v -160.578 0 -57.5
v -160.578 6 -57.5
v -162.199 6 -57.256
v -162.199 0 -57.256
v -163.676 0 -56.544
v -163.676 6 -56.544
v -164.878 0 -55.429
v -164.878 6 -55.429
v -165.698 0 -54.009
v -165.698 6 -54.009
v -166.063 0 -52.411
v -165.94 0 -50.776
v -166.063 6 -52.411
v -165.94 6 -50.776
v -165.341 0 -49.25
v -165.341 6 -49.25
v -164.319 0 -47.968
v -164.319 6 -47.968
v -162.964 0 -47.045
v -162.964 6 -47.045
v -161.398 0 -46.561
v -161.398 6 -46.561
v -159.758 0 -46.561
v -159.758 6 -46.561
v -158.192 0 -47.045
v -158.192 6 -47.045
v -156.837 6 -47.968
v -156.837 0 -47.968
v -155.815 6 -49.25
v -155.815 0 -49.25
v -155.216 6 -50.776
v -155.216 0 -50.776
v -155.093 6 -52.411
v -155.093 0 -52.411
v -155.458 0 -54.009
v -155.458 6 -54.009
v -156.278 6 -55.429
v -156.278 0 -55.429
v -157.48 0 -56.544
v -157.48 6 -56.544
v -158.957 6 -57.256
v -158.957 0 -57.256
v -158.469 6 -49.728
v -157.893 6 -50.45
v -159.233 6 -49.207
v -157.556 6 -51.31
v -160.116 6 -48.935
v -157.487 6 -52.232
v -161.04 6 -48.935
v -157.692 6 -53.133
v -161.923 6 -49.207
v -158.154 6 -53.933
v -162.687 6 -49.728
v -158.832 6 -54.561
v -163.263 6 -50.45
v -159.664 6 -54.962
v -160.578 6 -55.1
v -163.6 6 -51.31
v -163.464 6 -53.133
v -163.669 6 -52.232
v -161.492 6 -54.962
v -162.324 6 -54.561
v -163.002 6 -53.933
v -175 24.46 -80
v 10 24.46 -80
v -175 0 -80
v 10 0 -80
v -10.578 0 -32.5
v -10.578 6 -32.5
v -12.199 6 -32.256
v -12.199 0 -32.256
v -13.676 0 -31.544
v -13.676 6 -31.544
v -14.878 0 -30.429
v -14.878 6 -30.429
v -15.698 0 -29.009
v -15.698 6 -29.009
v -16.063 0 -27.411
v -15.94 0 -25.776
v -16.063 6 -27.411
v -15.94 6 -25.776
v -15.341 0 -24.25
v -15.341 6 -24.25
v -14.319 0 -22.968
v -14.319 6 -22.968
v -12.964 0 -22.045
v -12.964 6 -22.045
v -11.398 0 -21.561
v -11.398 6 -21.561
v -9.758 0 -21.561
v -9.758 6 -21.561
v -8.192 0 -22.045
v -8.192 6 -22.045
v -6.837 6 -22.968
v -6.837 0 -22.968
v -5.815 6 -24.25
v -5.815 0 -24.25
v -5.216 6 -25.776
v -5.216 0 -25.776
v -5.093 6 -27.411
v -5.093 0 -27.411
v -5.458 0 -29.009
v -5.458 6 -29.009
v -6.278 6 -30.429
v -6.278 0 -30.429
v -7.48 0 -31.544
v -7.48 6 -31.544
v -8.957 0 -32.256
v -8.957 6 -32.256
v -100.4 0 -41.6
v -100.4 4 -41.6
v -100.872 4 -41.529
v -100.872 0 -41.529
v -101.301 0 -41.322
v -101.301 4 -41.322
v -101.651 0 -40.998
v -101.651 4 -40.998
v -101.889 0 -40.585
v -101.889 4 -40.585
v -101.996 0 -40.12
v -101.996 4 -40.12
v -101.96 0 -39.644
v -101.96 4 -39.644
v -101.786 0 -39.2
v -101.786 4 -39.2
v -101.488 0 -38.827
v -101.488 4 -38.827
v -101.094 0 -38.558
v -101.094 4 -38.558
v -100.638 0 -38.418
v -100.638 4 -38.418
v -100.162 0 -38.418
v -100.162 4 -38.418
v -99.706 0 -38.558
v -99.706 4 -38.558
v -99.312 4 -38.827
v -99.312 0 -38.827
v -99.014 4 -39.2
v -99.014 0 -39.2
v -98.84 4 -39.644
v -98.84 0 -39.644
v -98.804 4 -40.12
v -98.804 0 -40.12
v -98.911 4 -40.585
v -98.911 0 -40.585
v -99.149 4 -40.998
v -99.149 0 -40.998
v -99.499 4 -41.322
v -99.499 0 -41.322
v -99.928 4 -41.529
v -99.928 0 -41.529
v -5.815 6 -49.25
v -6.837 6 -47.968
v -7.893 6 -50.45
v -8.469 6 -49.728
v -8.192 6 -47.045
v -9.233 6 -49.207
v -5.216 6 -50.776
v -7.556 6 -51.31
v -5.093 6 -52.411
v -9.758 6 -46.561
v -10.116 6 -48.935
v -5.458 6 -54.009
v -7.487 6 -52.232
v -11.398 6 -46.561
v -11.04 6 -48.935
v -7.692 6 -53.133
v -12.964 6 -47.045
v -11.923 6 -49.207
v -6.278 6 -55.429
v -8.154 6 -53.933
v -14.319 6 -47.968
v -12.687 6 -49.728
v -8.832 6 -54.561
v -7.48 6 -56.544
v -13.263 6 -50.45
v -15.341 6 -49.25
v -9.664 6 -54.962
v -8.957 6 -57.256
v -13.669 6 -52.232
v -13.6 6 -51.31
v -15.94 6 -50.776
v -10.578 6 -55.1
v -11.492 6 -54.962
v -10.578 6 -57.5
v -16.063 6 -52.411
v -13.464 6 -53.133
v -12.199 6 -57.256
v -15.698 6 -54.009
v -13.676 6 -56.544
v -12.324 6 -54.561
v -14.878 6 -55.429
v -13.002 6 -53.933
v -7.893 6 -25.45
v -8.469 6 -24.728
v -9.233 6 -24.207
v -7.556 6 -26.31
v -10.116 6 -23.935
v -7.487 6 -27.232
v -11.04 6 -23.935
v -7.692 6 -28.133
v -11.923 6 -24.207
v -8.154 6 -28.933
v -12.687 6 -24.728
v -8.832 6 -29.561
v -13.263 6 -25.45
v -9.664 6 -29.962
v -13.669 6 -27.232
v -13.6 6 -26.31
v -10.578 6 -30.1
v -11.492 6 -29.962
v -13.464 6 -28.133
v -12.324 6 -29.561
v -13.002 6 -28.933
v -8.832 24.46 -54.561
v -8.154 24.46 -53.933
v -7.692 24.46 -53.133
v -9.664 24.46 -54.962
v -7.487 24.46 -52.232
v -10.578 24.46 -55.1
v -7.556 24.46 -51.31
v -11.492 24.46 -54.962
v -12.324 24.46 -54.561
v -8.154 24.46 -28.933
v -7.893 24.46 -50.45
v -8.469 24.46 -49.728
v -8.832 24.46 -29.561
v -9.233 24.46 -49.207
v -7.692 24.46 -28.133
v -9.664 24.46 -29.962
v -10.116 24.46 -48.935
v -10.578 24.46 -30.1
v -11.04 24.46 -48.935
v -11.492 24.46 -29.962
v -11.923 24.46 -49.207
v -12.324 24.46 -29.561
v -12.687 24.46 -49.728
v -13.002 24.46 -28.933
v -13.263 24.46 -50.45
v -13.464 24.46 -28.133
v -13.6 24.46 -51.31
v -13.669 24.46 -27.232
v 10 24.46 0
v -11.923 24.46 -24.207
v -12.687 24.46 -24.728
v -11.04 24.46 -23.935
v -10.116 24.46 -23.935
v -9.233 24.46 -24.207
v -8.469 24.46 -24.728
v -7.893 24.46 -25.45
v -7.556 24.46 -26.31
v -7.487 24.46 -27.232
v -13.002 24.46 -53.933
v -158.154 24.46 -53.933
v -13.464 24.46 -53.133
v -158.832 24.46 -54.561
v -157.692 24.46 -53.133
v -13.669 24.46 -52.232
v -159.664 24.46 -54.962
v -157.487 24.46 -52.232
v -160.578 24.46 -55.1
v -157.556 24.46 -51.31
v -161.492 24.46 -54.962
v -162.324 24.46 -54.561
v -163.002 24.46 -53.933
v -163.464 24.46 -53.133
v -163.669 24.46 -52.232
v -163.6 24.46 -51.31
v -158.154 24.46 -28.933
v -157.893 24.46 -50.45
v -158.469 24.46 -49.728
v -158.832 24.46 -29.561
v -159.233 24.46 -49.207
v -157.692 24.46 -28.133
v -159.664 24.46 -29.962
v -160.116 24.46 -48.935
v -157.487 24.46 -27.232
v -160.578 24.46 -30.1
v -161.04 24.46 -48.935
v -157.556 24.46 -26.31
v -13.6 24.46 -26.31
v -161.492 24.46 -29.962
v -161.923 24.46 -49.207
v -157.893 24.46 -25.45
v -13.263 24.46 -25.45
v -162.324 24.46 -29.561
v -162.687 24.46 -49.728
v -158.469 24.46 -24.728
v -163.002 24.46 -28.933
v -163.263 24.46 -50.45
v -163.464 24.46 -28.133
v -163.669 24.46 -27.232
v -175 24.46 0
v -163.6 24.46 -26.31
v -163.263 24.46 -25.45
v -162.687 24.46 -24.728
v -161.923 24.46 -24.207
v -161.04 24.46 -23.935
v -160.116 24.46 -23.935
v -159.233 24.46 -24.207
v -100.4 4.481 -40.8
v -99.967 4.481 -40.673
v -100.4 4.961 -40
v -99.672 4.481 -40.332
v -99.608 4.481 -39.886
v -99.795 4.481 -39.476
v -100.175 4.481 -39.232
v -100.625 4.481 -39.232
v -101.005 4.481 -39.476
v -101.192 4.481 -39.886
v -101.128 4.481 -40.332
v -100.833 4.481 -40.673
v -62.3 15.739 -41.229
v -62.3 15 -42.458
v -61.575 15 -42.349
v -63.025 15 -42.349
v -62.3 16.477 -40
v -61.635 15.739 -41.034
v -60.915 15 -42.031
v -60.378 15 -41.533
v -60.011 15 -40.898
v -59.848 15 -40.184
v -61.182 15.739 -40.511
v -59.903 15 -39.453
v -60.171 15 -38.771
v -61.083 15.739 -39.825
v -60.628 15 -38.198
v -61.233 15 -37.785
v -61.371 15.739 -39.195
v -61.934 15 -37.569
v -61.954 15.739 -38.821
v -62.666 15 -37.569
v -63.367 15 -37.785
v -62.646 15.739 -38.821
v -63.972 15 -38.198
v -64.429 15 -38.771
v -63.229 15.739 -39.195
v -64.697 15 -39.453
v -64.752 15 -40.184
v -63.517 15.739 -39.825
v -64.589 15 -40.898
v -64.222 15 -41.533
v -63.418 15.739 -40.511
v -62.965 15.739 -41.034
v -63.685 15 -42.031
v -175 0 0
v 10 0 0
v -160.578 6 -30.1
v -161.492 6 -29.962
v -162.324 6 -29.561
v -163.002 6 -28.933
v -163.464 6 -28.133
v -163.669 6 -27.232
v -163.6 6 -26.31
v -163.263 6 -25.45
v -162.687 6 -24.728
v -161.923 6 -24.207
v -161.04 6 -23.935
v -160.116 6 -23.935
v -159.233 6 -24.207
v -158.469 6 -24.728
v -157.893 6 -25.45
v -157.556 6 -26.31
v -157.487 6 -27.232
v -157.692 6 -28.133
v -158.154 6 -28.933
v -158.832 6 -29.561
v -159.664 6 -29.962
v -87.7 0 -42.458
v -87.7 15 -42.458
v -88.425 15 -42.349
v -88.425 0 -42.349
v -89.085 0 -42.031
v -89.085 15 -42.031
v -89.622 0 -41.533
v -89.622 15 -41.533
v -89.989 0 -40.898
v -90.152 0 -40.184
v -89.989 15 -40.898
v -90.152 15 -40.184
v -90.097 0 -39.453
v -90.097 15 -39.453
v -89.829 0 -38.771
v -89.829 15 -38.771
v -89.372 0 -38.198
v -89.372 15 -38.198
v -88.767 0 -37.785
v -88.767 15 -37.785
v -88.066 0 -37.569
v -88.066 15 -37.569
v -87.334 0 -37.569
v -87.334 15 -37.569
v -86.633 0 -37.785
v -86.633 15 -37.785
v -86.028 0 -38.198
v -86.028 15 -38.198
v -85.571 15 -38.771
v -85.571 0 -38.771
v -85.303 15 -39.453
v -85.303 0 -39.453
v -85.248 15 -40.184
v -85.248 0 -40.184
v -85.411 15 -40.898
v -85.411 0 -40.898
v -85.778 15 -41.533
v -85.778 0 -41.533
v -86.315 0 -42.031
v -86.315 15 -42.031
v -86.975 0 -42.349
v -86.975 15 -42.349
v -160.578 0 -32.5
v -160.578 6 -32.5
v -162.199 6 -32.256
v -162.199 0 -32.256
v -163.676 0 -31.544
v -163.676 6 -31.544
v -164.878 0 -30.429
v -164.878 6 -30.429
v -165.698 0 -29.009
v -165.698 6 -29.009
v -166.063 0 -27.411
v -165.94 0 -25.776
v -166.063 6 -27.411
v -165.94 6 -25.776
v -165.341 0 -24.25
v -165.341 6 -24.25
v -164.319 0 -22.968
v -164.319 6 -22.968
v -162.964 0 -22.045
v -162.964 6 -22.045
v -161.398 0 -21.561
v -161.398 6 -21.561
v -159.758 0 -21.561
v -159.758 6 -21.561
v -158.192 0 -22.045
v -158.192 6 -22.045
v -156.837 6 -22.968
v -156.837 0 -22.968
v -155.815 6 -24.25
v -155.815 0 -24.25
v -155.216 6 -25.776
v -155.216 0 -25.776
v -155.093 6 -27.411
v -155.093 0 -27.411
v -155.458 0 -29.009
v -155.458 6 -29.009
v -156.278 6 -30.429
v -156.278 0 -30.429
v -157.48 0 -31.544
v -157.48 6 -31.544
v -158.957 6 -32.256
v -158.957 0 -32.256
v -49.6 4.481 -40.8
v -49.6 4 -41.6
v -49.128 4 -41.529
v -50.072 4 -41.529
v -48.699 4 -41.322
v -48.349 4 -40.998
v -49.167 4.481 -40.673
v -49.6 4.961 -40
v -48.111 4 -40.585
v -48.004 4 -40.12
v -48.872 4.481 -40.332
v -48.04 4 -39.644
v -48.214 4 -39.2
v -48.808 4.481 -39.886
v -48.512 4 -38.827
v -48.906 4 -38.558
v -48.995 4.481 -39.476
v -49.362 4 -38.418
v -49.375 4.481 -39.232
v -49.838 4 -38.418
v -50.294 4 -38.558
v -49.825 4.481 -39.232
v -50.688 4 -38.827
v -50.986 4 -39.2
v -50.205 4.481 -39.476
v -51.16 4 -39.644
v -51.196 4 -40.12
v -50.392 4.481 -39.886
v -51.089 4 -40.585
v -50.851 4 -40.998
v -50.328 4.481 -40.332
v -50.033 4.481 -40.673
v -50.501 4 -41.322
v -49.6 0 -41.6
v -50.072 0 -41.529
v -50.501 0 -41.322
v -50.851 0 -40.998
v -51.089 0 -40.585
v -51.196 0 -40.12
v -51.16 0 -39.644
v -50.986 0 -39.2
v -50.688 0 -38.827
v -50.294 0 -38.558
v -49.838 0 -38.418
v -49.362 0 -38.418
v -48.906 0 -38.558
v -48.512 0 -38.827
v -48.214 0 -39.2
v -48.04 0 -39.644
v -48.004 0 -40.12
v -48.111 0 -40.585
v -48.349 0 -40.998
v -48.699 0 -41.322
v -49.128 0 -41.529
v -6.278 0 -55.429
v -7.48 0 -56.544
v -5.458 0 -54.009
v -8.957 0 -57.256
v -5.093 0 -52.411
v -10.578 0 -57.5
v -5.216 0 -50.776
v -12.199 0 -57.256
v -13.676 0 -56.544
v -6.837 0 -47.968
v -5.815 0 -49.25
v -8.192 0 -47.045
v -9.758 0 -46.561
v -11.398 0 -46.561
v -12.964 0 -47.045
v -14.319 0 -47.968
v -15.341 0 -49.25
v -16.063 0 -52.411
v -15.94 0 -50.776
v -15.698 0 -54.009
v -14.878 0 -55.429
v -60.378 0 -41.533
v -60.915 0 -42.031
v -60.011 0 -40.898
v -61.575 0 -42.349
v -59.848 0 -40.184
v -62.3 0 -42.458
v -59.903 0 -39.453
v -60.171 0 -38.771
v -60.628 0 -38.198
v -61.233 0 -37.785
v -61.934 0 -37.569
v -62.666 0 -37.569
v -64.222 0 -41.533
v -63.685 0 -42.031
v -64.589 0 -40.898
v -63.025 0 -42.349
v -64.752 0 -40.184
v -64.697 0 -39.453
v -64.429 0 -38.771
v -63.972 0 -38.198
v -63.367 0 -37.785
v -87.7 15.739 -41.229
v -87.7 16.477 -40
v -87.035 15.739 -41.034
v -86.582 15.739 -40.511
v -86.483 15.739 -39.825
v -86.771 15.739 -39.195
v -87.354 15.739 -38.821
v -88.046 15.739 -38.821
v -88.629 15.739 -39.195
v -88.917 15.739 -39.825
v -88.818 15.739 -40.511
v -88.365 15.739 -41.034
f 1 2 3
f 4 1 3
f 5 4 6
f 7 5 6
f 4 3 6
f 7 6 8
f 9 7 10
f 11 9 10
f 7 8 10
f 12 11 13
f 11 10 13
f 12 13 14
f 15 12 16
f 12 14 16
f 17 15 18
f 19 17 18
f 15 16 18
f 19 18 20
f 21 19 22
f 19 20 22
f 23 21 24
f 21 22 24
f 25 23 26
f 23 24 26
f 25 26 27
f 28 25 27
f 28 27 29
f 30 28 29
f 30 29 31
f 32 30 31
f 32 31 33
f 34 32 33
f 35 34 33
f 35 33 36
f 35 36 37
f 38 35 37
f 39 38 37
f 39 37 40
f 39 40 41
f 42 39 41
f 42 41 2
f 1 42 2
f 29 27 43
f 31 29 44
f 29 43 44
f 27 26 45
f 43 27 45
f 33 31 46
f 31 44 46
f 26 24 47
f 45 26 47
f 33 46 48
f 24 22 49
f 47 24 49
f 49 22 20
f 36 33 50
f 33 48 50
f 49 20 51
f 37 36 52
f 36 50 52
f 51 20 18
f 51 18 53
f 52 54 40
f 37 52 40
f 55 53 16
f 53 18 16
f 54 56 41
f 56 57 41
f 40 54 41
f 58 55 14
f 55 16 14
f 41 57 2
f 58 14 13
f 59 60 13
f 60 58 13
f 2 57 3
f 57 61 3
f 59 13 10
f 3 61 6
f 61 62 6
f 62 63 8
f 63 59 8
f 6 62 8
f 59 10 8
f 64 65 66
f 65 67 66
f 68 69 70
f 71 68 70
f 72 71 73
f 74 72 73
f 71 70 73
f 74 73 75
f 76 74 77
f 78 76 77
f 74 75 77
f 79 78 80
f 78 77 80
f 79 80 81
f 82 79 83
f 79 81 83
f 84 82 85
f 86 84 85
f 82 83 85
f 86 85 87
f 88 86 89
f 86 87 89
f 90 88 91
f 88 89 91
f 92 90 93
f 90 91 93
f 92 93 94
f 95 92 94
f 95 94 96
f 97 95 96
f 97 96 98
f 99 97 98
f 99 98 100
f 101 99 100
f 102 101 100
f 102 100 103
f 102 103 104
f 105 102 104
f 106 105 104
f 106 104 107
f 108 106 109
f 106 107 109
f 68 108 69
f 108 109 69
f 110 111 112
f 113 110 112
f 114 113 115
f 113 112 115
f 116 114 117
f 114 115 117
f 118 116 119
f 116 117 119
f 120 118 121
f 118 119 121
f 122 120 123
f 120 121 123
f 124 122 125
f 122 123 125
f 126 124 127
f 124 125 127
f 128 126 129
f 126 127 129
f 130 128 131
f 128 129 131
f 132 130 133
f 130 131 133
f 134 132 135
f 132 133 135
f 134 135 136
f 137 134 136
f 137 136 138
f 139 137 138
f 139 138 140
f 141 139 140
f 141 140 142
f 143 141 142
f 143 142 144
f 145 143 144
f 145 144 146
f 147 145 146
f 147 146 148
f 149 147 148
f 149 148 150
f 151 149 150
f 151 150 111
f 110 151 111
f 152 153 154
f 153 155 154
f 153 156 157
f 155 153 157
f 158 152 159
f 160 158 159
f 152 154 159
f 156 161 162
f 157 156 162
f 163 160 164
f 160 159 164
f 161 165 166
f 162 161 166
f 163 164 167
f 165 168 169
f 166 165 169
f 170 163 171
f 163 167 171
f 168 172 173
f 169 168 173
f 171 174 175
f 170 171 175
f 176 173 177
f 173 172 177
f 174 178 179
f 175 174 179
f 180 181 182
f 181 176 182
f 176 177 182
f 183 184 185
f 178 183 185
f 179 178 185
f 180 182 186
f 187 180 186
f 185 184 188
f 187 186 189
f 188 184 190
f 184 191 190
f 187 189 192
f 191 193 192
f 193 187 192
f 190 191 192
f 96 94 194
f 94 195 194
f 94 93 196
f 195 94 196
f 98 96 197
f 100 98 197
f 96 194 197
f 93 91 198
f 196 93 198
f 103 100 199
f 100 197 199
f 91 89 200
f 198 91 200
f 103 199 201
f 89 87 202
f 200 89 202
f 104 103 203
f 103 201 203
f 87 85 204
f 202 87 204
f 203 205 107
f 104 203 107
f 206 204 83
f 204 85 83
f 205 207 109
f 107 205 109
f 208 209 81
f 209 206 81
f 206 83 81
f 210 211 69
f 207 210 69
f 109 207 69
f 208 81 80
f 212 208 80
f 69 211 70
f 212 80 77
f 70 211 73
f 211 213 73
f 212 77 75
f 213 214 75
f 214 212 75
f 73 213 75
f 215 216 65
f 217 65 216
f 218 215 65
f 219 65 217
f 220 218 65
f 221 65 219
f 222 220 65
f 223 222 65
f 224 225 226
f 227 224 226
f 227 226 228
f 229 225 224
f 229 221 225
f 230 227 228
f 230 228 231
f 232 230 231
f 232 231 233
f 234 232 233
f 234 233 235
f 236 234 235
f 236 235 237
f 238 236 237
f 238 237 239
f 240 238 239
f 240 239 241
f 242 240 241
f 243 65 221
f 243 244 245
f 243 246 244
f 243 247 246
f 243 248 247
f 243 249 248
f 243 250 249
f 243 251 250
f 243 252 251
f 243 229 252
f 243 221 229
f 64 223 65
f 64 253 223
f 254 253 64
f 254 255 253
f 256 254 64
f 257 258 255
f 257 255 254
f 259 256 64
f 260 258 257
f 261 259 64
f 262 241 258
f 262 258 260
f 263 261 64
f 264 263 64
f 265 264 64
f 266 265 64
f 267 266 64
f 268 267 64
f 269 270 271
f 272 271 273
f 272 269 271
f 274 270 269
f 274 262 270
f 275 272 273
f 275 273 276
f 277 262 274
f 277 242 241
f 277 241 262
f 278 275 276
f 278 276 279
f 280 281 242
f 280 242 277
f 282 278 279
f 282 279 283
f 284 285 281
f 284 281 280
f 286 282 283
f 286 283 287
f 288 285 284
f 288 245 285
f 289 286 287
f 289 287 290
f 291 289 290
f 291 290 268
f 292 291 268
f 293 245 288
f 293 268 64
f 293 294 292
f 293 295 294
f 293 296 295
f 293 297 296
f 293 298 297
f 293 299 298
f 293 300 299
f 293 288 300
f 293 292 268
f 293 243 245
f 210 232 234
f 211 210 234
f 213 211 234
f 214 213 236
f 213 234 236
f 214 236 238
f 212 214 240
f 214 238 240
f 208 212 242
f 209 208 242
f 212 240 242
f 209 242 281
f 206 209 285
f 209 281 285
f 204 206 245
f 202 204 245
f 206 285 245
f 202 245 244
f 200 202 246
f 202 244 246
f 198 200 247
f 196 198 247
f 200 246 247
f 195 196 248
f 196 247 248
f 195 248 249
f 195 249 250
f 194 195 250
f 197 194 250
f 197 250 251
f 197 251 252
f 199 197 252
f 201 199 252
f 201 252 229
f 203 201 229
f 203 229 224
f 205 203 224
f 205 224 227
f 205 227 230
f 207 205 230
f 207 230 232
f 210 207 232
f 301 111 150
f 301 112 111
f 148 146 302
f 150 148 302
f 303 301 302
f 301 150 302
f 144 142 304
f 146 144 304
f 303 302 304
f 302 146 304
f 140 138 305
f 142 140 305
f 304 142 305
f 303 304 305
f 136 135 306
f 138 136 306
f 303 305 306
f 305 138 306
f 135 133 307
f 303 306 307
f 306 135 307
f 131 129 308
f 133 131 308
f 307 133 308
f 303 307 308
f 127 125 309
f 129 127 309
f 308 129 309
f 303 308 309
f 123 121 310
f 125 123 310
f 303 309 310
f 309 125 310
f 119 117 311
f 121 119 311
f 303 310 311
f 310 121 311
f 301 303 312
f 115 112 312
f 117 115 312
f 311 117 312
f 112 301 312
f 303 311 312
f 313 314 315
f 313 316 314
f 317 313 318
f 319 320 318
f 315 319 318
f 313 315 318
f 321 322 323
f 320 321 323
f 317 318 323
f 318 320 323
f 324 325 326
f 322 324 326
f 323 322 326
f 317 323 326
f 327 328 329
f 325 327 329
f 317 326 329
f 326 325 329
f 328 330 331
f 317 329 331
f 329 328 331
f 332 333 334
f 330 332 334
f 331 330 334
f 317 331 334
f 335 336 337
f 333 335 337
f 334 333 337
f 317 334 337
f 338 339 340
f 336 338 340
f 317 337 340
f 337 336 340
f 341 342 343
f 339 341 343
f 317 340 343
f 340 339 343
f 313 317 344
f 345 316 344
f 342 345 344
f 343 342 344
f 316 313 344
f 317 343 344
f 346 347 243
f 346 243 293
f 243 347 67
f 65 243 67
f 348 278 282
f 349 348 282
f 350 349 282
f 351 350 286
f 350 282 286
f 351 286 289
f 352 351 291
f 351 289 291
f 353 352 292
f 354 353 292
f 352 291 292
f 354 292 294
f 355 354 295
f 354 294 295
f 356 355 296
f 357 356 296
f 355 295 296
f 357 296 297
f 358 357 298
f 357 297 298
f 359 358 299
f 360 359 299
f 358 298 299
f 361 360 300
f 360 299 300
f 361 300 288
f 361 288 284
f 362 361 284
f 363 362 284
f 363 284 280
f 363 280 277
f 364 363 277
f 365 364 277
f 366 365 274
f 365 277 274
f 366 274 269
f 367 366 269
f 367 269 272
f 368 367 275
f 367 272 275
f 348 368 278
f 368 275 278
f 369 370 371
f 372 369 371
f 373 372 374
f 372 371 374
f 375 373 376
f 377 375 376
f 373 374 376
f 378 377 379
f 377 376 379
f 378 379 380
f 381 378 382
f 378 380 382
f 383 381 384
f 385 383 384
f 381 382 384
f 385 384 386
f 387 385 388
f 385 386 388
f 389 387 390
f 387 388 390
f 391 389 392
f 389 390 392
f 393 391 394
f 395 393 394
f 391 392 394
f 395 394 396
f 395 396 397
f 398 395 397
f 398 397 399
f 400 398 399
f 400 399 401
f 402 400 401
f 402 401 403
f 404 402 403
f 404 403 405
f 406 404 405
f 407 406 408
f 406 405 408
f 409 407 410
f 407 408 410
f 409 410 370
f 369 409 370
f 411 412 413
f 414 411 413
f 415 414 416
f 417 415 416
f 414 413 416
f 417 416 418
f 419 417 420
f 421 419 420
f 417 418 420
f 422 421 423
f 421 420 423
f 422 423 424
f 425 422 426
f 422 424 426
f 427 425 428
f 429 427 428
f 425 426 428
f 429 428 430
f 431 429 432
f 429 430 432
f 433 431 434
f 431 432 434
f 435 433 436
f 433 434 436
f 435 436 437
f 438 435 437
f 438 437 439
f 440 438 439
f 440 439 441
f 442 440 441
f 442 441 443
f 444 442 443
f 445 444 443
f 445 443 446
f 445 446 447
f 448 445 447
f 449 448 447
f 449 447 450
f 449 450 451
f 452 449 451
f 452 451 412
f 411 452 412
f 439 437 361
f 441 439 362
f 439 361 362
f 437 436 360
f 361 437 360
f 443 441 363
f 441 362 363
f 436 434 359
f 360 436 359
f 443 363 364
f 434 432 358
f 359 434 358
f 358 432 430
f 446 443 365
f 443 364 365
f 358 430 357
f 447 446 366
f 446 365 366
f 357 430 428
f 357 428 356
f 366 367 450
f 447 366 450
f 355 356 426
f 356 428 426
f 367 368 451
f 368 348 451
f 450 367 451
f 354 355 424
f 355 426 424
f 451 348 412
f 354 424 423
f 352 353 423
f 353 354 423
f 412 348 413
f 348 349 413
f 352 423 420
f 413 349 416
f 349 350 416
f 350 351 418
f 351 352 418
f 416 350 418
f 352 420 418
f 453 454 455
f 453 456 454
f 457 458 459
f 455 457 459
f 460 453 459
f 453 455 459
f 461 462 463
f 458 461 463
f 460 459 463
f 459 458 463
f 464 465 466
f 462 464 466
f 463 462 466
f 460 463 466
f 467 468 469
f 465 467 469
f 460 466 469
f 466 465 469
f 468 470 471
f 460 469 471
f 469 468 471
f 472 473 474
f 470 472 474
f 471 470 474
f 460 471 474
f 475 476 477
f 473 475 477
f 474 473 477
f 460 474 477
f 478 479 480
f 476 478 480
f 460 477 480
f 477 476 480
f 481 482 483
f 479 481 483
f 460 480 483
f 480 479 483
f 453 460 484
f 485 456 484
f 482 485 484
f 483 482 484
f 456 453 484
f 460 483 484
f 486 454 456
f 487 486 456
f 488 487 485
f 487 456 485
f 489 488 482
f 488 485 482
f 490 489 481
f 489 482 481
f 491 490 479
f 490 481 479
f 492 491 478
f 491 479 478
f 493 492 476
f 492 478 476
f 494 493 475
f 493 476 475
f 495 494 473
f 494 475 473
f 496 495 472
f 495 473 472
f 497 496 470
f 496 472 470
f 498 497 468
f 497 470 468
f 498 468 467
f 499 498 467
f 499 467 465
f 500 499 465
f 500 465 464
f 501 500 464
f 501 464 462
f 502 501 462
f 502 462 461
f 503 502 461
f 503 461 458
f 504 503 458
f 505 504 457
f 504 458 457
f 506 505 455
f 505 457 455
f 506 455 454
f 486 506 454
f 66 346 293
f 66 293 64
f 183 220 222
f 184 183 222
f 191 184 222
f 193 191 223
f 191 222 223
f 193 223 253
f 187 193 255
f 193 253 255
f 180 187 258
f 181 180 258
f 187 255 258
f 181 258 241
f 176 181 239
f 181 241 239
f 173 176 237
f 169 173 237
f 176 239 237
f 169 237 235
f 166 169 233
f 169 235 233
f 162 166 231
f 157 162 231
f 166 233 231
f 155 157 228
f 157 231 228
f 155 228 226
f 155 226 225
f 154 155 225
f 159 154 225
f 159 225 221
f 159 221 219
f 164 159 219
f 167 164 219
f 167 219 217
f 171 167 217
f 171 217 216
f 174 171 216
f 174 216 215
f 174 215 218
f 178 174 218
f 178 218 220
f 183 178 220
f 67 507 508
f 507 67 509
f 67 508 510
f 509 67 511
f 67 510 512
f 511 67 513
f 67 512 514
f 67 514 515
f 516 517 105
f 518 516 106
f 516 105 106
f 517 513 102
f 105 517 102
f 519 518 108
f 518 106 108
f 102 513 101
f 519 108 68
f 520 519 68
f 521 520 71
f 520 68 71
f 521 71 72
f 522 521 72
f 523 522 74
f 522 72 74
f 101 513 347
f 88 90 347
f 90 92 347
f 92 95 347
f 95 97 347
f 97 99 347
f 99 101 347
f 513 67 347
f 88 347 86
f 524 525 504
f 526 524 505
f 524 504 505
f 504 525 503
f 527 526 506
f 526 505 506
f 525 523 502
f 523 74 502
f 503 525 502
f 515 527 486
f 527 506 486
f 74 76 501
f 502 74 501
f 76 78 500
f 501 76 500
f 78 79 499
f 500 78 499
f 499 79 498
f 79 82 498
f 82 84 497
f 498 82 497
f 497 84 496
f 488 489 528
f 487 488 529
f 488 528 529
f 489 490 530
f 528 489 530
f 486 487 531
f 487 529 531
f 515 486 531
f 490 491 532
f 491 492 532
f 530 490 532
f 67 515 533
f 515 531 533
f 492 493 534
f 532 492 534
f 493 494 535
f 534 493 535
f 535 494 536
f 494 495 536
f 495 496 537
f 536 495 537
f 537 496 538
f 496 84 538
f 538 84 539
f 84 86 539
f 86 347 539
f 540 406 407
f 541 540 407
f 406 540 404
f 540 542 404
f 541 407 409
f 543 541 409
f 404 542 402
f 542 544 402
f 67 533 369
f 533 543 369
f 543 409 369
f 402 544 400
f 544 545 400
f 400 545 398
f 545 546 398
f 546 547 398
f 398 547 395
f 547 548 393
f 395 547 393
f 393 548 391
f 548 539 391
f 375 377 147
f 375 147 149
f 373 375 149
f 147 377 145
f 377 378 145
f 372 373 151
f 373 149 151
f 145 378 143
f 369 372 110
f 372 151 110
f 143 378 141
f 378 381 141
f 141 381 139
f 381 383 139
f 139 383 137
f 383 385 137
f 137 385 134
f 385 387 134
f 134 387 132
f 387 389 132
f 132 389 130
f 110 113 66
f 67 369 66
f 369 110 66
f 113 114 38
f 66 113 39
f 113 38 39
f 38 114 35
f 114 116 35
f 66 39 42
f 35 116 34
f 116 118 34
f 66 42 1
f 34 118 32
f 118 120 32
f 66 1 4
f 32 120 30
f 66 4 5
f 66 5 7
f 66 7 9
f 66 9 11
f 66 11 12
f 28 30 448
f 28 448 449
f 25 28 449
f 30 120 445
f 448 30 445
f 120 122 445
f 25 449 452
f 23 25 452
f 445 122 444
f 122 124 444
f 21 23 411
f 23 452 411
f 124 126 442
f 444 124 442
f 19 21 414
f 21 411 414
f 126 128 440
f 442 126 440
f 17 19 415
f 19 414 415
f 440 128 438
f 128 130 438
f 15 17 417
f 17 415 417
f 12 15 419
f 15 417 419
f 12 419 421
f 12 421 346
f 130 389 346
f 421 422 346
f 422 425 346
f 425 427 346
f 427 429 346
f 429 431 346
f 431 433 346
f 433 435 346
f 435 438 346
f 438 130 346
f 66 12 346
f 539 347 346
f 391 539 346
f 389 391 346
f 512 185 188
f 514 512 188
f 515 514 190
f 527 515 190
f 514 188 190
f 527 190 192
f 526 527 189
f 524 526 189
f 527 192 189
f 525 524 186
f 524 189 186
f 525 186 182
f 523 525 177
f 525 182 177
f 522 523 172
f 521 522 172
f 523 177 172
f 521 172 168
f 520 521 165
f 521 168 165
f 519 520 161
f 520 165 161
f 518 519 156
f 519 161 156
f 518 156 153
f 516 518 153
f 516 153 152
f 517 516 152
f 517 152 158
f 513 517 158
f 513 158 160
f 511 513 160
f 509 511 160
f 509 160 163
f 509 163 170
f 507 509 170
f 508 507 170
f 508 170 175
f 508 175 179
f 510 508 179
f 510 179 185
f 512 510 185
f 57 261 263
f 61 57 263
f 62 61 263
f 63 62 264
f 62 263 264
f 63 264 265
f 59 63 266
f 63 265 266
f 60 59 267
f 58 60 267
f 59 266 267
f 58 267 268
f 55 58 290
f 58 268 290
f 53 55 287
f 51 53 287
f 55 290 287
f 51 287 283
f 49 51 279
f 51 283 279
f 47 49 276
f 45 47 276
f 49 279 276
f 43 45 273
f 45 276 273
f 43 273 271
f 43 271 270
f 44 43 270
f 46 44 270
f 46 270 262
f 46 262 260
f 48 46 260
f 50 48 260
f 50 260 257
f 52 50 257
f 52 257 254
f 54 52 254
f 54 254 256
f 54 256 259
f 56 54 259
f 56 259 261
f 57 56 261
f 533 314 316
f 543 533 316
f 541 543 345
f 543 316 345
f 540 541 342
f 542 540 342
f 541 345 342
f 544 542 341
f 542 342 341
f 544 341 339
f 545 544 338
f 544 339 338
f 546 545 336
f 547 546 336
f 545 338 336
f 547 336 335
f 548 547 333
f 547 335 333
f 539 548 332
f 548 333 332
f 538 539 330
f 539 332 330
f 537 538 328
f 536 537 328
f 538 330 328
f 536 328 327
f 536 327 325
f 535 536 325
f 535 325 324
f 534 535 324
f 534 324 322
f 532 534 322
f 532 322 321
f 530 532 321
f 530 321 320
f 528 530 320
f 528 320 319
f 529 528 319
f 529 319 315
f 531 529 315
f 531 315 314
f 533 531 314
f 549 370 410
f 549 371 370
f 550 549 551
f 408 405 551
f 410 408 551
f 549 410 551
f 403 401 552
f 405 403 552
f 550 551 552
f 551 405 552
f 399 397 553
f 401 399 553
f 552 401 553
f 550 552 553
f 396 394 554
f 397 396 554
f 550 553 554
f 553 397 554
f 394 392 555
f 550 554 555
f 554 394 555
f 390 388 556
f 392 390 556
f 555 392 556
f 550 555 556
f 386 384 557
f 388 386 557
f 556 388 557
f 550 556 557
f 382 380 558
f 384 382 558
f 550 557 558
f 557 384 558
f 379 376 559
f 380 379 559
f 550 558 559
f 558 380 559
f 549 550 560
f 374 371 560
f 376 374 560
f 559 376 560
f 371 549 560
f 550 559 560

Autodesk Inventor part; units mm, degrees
ref_plane "YZ Plane" through (0, 0, 0) normal (1, 0, 0) x (0, 1, 0)
ref_plane "XZ Plane" through (0, 0, 0) normal (0, 1, 0) x (-1, 0, 0)
ref_plane "XY Plane" through (0, 0, 0) normal (0, 0, 1) x (1, 0, 0)
sketch "Sketch1" plane through (0, 0, 0) normal (0, 1, 0) x (-1, 0, 0)
  line L0 (0, 0) -> (150, 0)
  line L1 (150, 0) -> (150, -80)
  line L2 (150, -80) -> (0, -80)
  line L3 (0, -80) -> (0, 0)
  line L4 (150, -80) -> (0, -80)
  line L5 (0, -80) -> (0, -40)
  line L6 (0, -40) -> (150, -40)
  line L7 (150, -40) -> (150, -80)
  line L8 (150, -40) -> (100.4, -40)
  line L9 (100.4, -40) -> (87.7, -40)
  line L10 (87.7, -40) -> (62.3, -40)
  line L11 (62.3, -40) -> (49.6, -40)
  line L12 (0, 0) -> (10.578, 0)
  line L13 (10.578, 0) -> (10.578, -80)
  line L14 (10.578, -80) -> (0, -80)
  line L15 (0, -80) -> (0, 0)
  line L16 (10.578, 0) -> (10.578, -27)
  line L17 (10.578, -27) -> (10.578, -52)
  line L18 (10.578, -52) -> (10.578, -77)
  line L19 (150, 0) -> (160.578, 0)
  line L20 (160.578, 0) -> (160.578, -80)
  line L21 (160.578, -80) -> (150, -80)
  line L22 (150, -80) -> (150, 0)
  line L23 (160.578, 0) -> (160.578, -27)
  line L24 (160.578, -27) -> (160.578, -52)
  line L25 (160.578, -52) -> (160.578, -77)
  line L26 (0, 0) -> (-10, 0)
  line L27 (-10, 0) -> (-10, -80)
  line L28 (-10, -80) -> (0, -80)
  line L29 (0, -80) -> (0, 0)
  line L30 (150, 0) -> (175, 0)
  line L31 (175, 0) -> (175, -80)
  line L32 (175, -80) -> (150, -80)
  line L33 (150, -80) -> (150, 0)
  dimension "d0" = 150
  dimension "d1" = 80
  dimension "d2" = 40
  dimension "d3" = 49.6
  dimension "d4" = 12.7
  dimension "d5" = 25.4
  dimension "d6" = 12.7
  dimension "d34" = 10.578
  dimension "d35" = 27
  dimension "d36" = 25
  dimension "d37" = 25
  dimension "d46" = 27
  dimension "d47" = 25
  dimension "d48" = 25
  dimension "d49" = 10
  dimension "d50" = 25
  dimension "d51" = 14.422
extrude "Extrusion1" add sketch "Sketch1" along normal blind 24.46
hole "Hole1" at (-49.6, 0, -40) at (-100.4, 0, -40) direction (0, 1, 0) diameter 3.2 depth 4 tip angle 118
hole "Hole2" at (-87.7, 0, -40) at (-62.3, 0, -40) direction (0, 1, 0) diameter 4.917 depth 15 tip angle 118 thread size "M6x1" class "6H" standard "ANSI Metric M Profile"
hole "Hole4" at (-160.578, 0, -27) at (-160.578, 0, -52) at (-10.578, 0, -27) at (-10.578, 0, -52) direction (0, 1, 0) diameter 6.2 end through all counterbore diameter 11 counterbore depth 6 clearance for "Socket Head Cap Screw" size "M6" standard "Ansi Metric M Profile"
properties part number "CameraAdapter_part3"
